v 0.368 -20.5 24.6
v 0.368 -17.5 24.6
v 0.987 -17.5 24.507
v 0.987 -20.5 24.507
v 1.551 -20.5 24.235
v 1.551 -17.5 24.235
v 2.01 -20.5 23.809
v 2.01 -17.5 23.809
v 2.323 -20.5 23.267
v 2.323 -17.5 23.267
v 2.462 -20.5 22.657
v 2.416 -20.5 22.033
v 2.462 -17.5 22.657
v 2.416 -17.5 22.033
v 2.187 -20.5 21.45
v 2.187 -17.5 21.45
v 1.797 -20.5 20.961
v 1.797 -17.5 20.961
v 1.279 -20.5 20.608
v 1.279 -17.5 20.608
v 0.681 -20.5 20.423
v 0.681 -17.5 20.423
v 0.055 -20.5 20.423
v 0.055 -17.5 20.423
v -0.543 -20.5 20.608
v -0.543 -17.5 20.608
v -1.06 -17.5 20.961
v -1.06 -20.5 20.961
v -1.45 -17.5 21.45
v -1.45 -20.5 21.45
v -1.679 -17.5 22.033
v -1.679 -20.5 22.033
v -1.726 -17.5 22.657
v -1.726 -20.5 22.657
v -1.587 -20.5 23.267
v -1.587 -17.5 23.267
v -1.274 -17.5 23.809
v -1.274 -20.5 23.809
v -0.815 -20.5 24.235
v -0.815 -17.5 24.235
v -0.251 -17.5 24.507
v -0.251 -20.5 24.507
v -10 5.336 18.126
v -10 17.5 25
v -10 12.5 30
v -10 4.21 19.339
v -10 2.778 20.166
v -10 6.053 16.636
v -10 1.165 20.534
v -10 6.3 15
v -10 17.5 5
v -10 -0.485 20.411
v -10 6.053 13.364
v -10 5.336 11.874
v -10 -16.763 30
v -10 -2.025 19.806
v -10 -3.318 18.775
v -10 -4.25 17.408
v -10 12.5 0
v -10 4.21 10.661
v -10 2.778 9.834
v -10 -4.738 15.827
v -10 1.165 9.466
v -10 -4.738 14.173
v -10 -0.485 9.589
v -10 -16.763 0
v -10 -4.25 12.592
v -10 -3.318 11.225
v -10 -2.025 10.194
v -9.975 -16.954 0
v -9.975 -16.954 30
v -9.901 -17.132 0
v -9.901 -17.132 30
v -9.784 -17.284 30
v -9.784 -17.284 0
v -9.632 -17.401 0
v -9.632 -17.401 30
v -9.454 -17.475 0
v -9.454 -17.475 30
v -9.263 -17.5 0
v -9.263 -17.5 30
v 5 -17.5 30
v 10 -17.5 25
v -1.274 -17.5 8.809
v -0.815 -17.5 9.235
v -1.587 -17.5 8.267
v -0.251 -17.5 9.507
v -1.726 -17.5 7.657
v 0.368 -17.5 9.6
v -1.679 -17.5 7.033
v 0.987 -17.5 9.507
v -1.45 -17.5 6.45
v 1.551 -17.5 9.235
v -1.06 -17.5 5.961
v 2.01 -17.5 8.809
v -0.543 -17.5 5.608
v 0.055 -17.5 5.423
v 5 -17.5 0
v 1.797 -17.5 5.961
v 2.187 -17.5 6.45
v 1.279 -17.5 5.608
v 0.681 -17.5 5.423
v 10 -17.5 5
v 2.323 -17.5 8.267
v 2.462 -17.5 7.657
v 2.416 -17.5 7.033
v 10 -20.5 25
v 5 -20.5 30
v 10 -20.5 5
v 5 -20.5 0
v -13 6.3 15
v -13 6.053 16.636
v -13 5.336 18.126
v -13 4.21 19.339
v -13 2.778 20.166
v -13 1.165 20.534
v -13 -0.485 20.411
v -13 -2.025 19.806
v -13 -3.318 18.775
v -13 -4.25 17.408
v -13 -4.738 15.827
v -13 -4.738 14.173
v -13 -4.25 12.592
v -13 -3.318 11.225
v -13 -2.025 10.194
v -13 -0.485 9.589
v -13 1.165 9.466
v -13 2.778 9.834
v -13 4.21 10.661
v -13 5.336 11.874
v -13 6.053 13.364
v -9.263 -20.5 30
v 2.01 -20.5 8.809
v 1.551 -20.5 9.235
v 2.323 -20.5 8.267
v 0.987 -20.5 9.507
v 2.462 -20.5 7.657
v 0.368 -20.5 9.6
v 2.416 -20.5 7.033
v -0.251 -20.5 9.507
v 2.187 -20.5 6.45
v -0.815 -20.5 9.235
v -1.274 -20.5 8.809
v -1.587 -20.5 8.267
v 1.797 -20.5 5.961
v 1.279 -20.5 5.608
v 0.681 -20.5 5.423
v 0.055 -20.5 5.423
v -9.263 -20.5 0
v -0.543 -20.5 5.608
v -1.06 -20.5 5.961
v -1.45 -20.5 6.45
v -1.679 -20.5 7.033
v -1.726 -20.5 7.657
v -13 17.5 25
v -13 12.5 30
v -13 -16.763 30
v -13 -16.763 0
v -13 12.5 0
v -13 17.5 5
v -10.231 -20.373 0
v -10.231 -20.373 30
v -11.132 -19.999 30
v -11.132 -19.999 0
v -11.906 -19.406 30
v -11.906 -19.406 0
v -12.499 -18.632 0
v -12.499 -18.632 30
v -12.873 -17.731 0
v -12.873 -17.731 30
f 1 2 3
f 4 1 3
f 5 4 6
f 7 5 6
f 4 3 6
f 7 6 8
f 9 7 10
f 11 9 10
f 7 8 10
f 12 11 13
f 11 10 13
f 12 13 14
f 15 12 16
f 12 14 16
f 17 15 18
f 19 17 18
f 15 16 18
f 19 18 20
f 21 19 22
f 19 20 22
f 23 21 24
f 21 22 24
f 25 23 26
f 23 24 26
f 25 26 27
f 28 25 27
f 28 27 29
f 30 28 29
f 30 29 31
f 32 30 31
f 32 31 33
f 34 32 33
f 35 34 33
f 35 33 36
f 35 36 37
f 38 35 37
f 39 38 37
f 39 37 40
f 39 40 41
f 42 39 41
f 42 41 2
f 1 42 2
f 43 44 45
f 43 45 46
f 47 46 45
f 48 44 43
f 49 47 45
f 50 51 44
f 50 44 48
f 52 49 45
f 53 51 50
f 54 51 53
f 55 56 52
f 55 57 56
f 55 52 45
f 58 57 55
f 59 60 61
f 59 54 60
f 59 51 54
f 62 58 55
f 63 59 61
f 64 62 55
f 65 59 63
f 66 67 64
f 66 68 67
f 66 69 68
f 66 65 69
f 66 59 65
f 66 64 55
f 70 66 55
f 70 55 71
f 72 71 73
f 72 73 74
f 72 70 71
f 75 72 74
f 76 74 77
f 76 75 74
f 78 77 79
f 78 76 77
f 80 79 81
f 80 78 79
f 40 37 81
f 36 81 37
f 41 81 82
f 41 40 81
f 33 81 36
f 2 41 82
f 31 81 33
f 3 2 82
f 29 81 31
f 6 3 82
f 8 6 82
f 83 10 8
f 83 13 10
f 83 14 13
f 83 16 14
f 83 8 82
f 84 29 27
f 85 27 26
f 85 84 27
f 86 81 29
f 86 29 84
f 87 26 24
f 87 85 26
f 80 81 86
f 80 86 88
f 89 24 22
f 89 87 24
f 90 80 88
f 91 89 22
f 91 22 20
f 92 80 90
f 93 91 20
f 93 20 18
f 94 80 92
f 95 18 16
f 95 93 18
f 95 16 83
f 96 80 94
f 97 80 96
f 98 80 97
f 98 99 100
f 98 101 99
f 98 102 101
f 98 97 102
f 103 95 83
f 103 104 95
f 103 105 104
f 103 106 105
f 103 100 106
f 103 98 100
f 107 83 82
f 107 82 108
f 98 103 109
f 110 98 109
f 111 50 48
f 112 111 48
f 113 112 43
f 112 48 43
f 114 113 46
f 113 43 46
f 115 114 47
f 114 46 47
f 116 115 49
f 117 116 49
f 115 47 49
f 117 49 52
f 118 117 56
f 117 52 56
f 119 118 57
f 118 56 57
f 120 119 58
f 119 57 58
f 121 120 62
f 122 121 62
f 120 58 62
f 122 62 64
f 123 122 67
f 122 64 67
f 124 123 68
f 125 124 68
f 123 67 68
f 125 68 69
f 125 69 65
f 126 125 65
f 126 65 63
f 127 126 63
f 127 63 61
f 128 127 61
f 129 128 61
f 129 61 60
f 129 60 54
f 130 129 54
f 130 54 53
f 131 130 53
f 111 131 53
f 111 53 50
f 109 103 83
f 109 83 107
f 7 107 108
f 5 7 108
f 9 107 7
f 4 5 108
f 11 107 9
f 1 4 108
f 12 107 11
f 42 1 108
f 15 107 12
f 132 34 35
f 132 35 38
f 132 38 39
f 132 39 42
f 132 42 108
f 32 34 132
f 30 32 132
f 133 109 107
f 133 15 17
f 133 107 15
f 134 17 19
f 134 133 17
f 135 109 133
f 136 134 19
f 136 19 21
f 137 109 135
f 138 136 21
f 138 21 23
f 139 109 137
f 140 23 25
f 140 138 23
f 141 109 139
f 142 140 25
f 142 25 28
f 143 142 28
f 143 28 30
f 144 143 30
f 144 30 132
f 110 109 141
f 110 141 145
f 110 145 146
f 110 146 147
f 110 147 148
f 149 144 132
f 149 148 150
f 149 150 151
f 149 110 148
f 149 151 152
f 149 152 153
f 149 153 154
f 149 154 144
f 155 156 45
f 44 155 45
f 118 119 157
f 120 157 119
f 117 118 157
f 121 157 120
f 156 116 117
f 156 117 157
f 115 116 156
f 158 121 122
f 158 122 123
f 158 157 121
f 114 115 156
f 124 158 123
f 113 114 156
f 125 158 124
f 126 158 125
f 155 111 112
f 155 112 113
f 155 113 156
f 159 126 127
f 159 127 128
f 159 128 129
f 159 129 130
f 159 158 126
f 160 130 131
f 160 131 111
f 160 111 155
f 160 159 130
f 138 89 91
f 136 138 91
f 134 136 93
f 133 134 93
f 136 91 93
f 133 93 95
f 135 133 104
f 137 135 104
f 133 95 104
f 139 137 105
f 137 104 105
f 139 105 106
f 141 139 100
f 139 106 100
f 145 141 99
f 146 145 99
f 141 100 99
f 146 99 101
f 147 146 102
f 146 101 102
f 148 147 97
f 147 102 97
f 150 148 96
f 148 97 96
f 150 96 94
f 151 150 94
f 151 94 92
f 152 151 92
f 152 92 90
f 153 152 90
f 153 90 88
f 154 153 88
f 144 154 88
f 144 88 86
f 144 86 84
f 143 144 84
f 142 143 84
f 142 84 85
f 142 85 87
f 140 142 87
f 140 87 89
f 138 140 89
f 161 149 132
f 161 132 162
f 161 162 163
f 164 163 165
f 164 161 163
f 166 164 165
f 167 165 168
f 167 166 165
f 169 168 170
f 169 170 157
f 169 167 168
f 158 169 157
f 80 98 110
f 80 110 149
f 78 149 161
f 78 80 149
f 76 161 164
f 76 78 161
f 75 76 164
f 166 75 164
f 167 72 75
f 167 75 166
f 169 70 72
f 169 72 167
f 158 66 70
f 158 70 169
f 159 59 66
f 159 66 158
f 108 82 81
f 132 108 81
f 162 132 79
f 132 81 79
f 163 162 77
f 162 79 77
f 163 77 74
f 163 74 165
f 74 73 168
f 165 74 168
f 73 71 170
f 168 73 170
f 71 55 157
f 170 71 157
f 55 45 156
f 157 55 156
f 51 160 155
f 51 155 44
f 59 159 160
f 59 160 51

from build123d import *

# Parameters (mm, degrees)
SM_BASE_FLANGE_1_DEPTH = 30
CUT_EXTRUDE_1_REACH    = 43.476
SKETCH_6_R             = 5.55
CUT_EXTRUDE_2_REACH    = 49.896
SKETCH_7_R             = 2.1
CHAMFER_1_SIZE         = 5


# Sheet-metal steps are written as plain solids
with BuildPart() as part:
    # Sketch 1 → 基材-凸緣1 (new body)
    with BuildSketch(Plane.XY):
        with BuildLine():
            Line((-10, 17.5), (-10, -16.7634))
            ThreePointArc((-10, -16.7634), (-9.784254855, -17.284254855), (-9.2634, -17.5))
            Line((-9.2634, -17.5), (10, -17.5))
            Line((10, -17.5), (10, -20.5))
            Line((10, -20.5), (-9.2634, -20.5))
            ThreePointArc((-9.2634, -20.5), (-11.905575199, -19.405575199), (-13, -16.7634))
            Line((-13, -16.7634), (-13, 17.5))
            Line((-13, 17.5), (-10, 17.5))
        make_face()
    extrude(amount=SM_BASE_FLANGE_1_DEPTH)

    # 草圖6 → 除料-伸長1 (cut, up to next)
    with BuildSketch(Plane(origin=(-10, 0, 0), x_dir=(0, 0, -1), z_dir=(1, 0, 0)), mode=Mode.PRIVATE) as cut_extrude_1_sk1:
        with Locations(Location((-15, 0.75, 0), (0, 0, 90))):
            Circle(SKETCH_6_R)
    cut_extrude_1_tool1 = extrude(cut_extrude_1_sk1.sketch, amount=-CUT_EXTRUDE_1_REACH, mode=Mode.PRIVATE) & part.part
    add(cut_extrude_1_tool1.solids().sort_by_distance((-10, 0.75, 15))[0], mode=Mode.SUBTRACT)

    # 草圖7 → 除料-伸長2 (cut, up to next)
    with BuildSketch(Plane(origin=(0, -17.5, 0), x_dir=(1, 0, 0), z_dir=(0, 1, 0)), mode=Mode.PRIVATE) as cut_extrude_2_sk1:
        with Locations(Location((0.3683, -22.5, 0), (0, 0, 270))):
            Circle(SKETCH_7_R)
    cut_extrude_2_tool1 = extrude(cut_extrude_2_sk1.sketch, amount=-CUT_EXTRUDE_2_REACH, mode=Mode.PRIVATE) & part.part
    # 草圖7 → 除料-伸長2 (cut, up to next)
    with BuildSketch(Plane(origin=(0, -17.5, 0), x_dir=(1, 0, 0), z_dir=(0, 1, 0)), mode=Mode.PRIVATE) as cut_extrude_2_sk2:
        with Locations(Location((0.3683, -7.5, 0), (0, 0, 270))):
            Circle(SKETCH_7_R)
    cut_extrude_2_tool2 = extrude(cut_extrude_2_sk2.sketch, amount=-CUT_EXTRUDE_2_REACH, mode=Mode.PRIVATE) & part.part
    add(cut_extrude_2_tool1.solids().sort_by_distance((0.3683, -17.5, 22.5))[0], mode=Mode.SUBTRACT)
    add(cut_extrude_2_tool2.solids().sort_by_distance((0.3683, -17.5, 7.5))[0], mode=Mode.SUBTRACT)

    # 導角1
    chamfer_1_edges = [part.edges().sort_by_distance(p)[0] for p in [
        (-11.5, 17.5, 30),
        (-11.5, 17.5, 0),
        (10, -19, 30),
        (10, -19, 0),
    ]]
    chamfer(chamfer_1_edges, length=CHAMFER_1_SIZE)


solid = part.part
